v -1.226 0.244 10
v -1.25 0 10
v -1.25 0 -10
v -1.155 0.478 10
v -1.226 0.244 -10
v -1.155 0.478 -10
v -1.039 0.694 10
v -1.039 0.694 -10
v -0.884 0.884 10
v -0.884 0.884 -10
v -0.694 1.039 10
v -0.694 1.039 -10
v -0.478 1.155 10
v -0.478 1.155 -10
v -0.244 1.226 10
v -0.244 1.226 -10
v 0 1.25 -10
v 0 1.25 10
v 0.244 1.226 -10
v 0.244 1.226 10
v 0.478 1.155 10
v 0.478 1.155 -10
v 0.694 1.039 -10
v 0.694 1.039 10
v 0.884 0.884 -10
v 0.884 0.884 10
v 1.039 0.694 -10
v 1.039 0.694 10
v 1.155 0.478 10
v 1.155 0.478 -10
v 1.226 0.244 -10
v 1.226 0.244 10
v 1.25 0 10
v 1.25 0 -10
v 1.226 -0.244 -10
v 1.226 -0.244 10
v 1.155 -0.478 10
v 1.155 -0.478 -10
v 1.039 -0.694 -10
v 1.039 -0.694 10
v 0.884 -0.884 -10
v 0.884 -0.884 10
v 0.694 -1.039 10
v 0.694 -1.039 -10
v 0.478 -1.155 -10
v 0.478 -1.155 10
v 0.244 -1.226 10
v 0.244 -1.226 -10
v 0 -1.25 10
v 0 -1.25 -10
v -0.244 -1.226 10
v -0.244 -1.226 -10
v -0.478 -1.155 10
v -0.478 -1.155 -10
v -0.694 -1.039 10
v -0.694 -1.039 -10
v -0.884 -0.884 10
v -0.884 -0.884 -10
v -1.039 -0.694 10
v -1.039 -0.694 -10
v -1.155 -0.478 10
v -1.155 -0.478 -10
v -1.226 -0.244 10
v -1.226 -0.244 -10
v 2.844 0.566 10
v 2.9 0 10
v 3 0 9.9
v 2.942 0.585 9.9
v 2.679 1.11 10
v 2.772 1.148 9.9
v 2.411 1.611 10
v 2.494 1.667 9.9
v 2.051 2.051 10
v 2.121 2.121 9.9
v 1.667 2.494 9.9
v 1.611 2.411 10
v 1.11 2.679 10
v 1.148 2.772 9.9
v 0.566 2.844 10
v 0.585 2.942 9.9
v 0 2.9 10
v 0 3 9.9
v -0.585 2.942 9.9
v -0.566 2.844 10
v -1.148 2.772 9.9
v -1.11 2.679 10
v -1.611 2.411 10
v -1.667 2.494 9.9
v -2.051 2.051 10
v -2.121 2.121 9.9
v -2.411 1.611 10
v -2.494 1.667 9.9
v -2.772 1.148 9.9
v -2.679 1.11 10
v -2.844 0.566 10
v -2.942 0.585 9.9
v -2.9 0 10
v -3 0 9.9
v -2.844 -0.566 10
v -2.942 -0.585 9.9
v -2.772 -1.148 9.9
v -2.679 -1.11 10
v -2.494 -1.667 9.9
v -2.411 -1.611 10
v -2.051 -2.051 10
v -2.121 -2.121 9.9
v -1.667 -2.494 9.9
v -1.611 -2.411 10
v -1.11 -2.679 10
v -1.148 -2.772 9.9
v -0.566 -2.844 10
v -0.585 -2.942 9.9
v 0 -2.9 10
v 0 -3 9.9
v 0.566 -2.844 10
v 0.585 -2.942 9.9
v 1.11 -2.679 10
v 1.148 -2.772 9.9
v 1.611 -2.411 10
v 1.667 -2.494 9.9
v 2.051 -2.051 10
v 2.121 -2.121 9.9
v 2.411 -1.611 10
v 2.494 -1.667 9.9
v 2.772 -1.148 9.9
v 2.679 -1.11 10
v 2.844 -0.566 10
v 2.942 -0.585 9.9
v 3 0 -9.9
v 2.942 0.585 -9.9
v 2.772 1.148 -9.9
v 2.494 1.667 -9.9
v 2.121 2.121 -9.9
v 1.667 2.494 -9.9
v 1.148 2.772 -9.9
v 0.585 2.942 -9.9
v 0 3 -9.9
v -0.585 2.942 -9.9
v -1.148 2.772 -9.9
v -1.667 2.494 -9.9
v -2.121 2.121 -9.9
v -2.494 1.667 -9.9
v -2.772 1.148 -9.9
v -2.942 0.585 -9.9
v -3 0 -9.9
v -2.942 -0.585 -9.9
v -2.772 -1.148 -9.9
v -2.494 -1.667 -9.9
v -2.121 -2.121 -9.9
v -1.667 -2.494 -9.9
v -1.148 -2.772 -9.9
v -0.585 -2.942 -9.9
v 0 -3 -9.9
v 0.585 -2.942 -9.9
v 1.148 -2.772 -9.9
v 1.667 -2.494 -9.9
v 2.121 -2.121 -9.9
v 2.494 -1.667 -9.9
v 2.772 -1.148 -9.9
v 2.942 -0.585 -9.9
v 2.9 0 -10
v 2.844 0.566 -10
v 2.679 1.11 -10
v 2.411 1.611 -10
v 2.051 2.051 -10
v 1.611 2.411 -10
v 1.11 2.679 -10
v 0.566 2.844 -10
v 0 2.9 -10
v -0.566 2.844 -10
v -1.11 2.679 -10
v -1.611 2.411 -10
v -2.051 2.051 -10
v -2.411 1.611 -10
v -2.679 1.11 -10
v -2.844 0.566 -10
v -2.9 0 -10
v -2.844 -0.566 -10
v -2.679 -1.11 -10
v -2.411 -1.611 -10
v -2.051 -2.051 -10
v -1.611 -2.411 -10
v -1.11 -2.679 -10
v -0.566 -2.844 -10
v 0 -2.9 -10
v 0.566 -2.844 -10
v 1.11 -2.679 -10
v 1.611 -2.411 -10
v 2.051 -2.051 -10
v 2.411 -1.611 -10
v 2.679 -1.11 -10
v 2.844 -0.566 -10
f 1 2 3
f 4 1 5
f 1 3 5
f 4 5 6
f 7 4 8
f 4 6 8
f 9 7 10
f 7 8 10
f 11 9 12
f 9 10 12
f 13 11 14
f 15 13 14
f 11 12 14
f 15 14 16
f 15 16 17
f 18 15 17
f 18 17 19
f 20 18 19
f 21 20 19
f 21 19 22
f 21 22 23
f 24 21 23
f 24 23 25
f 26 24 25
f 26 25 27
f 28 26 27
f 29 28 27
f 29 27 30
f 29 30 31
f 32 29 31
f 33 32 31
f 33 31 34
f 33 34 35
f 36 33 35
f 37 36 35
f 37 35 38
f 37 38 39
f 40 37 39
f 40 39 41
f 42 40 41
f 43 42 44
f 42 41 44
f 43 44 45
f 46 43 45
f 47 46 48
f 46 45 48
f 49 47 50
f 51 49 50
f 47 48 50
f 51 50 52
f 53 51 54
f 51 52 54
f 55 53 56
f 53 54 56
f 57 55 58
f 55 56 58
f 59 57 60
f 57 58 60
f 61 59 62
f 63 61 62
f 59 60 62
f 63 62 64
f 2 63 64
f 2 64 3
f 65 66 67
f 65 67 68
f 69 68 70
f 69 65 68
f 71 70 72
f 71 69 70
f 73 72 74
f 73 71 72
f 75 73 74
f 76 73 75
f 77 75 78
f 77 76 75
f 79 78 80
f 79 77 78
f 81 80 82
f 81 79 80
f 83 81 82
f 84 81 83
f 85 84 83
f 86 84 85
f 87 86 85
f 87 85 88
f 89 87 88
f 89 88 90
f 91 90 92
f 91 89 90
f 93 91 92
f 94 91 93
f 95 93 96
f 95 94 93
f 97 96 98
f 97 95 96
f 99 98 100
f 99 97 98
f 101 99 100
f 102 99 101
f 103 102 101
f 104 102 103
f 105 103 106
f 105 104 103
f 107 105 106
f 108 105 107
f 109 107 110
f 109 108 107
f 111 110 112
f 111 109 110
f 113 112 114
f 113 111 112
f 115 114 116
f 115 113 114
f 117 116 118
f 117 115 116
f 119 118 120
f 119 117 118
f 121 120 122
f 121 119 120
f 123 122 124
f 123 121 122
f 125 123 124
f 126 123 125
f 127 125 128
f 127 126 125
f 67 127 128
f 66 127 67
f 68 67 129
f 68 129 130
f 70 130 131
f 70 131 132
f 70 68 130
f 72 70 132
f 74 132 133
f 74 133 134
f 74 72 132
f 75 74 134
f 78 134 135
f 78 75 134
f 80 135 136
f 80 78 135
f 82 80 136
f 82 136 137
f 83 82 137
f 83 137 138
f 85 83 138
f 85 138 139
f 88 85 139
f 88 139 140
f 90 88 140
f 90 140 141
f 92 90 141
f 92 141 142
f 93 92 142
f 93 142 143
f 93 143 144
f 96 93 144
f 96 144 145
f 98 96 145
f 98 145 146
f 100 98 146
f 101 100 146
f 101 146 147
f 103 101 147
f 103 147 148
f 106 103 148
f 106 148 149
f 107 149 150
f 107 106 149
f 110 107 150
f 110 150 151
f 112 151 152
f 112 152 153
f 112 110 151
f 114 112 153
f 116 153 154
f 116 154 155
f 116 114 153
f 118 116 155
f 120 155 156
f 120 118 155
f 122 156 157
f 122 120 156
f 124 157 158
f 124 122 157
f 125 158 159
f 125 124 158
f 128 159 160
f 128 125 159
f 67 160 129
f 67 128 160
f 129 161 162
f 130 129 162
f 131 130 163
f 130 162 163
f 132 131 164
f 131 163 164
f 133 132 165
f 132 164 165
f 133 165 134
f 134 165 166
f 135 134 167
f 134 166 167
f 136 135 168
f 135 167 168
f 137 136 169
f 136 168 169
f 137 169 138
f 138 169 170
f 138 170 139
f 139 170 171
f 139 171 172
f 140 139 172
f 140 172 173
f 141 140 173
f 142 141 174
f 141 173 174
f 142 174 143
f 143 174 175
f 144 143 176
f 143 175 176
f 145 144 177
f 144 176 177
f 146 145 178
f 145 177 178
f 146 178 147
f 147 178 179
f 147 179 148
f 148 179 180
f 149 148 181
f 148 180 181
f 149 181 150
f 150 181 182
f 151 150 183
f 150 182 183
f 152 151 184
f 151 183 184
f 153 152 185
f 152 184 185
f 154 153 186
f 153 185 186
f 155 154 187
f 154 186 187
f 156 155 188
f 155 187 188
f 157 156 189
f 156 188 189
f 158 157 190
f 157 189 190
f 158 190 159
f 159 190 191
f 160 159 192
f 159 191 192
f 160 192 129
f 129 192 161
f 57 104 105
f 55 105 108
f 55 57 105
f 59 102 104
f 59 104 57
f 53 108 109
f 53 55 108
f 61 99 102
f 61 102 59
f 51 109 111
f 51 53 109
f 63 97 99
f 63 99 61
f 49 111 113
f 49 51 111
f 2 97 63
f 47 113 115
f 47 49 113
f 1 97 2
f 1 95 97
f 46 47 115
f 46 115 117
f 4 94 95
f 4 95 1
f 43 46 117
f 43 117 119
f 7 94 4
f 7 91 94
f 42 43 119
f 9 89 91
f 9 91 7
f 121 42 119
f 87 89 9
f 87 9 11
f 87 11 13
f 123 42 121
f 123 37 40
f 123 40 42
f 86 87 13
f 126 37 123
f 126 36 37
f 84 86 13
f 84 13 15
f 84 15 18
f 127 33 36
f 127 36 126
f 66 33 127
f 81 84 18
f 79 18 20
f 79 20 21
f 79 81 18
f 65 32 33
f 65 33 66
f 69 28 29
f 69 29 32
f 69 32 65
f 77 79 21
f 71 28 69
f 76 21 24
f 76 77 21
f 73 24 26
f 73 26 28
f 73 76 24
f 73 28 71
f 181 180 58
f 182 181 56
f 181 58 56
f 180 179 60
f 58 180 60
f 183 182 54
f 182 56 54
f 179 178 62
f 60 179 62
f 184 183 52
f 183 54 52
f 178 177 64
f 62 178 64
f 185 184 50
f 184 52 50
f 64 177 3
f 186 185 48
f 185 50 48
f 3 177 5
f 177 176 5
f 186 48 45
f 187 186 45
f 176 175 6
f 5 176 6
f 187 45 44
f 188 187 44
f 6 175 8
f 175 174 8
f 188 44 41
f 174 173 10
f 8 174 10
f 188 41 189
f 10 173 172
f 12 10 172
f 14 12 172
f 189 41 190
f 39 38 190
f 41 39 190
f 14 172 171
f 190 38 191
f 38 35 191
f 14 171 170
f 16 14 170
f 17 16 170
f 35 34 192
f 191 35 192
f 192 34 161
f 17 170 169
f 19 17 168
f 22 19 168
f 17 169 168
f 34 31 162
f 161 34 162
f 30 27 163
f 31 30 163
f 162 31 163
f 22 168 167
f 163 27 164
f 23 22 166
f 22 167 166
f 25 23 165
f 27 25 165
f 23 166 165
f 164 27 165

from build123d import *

# Parameters (mm, degrees)
SKETCH_1_R         = 3
EXTRUDE_1_DEPTH    = 10
CHAMFER_1_SIZE     = 0.1
HOLE_WIZARD_M3_1_D = 2.5


with BuildPart() as part:
    # 草图1 → 凸台-拉伸1 (new, symmetric)
    with BuildSketch(Plane.XY):
        Circle(SKETCH_1_R)
    extrude(amount=EXTRUDE_1_DEPTH, both=True)

    # 倒角1
    chamfer_1_edges = [part.edges().sort_by_distance(p)[0] for p in [
        (-3, 0, -10),
        (-3, 0, 10),
    ]]
    chamfer(chamfer_1_edges, length=CHAMFER_1_SIZE)

    # M3 螺纹孔1 (through all)
    with Locations(Plane.XY.offset(10)):
        with Locations((0, 0)):
            Hole(HOLE_WIZARD_M3_1_D / 2)


solid = part.part
